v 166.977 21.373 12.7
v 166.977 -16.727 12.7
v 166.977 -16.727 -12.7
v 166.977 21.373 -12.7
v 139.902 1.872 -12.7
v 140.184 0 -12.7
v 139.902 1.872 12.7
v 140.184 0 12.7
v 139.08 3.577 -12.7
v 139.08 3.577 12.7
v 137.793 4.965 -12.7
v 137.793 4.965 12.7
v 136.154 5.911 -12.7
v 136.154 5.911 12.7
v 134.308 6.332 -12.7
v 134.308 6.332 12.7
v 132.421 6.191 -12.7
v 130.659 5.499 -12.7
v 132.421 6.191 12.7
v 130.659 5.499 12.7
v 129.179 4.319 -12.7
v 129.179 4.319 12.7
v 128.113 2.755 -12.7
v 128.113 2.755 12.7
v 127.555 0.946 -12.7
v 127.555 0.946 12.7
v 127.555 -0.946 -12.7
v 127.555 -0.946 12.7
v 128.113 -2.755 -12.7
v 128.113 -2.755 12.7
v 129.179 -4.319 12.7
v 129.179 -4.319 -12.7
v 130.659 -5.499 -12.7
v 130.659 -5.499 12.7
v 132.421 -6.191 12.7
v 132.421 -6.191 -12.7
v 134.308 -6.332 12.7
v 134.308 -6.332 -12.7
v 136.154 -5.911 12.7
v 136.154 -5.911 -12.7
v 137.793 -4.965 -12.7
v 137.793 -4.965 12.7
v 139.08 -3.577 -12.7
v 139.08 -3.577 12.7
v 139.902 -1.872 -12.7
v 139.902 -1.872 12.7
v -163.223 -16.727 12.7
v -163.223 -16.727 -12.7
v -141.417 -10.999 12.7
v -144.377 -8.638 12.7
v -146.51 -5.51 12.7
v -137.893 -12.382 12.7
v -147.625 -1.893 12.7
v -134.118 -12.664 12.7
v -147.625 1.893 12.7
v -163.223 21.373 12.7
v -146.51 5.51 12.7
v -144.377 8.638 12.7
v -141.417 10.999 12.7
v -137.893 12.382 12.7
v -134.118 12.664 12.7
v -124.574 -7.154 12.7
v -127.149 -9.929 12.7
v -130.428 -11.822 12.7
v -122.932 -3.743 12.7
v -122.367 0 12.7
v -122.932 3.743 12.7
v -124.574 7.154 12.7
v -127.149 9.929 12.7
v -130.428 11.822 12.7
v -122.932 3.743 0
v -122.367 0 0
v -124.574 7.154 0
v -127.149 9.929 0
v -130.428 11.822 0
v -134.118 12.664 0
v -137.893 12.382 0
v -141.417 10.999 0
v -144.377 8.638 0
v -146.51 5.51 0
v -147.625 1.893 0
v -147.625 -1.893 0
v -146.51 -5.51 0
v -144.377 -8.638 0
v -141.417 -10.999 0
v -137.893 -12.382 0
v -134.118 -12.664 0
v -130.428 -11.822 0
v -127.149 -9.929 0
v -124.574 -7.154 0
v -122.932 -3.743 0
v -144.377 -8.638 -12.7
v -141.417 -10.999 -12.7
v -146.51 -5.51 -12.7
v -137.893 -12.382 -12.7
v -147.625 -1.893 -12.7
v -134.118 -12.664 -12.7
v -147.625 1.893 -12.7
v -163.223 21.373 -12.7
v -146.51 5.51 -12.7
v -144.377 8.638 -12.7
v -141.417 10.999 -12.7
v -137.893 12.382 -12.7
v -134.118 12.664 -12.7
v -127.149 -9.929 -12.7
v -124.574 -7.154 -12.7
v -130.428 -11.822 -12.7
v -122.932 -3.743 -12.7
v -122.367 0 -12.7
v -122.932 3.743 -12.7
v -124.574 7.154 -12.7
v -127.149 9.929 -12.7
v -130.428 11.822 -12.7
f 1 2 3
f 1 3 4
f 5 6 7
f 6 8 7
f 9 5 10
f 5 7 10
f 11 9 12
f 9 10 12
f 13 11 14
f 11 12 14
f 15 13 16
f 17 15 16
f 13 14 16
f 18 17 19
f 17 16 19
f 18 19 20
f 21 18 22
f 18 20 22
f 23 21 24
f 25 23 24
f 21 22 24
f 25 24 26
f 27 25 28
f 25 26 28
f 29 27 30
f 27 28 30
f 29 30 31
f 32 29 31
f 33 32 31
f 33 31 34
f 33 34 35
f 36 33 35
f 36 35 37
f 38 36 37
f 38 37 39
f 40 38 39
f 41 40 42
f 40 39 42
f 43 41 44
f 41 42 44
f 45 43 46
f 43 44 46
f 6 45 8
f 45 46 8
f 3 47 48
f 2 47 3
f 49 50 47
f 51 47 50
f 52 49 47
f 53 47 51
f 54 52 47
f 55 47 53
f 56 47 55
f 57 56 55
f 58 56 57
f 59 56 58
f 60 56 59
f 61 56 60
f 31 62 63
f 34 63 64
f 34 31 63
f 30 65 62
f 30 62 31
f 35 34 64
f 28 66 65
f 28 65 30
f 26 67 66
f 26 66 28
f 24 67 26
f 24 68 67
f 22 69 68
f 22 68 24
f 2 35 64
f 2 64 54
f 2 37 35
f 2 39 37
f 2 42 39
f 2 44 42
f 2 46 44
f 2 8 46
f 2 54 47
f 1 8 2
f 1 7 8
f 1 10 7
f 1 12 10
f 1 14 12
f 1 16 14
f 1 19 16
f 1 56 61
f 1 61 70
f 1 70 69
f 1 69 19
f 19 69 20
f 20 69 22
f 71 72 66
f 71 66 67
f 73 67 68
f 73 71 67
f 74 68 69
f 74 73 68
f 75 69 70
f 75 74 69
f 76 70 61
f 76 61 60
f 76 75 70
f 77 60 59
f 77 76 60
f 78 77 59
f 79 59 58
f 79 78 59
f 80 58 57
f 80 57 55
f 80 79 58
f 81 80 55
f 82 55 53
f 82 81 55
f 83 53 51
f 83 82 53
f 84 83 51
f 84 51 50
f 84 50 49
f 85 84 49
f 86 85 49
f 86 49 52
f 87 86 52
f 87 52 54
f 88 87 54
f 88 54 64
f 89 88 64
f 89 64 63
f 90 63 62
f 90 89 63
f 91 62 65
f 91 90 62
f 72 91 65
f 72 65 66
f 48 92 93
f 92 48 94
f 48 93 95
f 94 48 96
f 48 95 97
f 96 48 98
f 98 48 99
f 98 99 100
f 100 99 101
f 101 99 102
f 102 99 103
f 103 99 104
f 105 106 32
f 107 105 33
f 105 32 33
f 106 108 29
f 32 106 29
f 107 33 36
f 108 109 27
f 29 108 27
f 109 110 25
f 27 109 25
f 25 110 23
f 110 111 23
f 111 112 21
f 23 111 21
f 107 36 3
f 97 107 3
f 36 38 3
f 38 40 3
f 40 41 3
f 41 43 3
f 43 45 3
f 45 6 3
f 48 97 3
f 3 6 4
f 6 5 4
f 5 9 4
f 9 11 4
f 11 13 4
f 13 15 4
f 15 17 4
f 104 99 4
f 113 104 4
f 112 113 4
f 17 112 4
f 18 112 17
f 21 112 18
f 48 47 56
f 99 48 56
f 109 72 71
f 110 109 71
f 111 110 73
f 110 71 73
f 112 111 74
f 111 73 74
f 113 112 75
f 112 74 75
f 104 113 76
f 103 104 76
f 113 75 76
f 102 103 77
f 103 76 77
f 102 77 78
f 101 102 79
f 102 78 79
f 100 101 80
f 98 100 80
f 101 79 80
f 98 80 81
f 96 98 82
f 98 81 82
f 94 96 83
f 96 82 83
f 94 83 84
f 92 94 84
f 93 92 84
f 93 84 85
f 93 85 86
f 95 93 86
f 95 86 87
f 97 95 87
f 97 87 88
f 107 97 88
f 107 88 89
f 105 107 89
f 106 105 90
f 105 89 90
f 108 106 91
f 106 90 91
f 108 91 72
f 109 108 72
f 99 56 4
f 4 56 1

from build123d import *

# Parameters (mm, degrees)
F0_W     = 330.2
F0_H     = 38.1
F2_DEPTH = 12.7
F1_R     = 12.7
F1_R_2   = 6.35
F3_DEPTH = 12.7


with BuildPart() as f2:
    # F0 (on Top) → F2 (new body, symmetric)
    with BuildSketch(Plane.XY):
        with Locations((1.8771, 2.322538)):
            Rectangle(F0_W, F0_H)
    extrude(amount=F2_DEPTH, both=True)

    # F1 (on Top) → F3 (cut, symmetric)
    with BuildSketch(Plane.XY):
        with Locations((-135.067344, 0)):
            Circle(F1_R)
        with Locations((133.833691, 0)):
            Circle(F1_R_2)
    extrude(amount=F3_DEPTH, both=True, mode=Mode.SUBTRACT)


solid = f2.part
